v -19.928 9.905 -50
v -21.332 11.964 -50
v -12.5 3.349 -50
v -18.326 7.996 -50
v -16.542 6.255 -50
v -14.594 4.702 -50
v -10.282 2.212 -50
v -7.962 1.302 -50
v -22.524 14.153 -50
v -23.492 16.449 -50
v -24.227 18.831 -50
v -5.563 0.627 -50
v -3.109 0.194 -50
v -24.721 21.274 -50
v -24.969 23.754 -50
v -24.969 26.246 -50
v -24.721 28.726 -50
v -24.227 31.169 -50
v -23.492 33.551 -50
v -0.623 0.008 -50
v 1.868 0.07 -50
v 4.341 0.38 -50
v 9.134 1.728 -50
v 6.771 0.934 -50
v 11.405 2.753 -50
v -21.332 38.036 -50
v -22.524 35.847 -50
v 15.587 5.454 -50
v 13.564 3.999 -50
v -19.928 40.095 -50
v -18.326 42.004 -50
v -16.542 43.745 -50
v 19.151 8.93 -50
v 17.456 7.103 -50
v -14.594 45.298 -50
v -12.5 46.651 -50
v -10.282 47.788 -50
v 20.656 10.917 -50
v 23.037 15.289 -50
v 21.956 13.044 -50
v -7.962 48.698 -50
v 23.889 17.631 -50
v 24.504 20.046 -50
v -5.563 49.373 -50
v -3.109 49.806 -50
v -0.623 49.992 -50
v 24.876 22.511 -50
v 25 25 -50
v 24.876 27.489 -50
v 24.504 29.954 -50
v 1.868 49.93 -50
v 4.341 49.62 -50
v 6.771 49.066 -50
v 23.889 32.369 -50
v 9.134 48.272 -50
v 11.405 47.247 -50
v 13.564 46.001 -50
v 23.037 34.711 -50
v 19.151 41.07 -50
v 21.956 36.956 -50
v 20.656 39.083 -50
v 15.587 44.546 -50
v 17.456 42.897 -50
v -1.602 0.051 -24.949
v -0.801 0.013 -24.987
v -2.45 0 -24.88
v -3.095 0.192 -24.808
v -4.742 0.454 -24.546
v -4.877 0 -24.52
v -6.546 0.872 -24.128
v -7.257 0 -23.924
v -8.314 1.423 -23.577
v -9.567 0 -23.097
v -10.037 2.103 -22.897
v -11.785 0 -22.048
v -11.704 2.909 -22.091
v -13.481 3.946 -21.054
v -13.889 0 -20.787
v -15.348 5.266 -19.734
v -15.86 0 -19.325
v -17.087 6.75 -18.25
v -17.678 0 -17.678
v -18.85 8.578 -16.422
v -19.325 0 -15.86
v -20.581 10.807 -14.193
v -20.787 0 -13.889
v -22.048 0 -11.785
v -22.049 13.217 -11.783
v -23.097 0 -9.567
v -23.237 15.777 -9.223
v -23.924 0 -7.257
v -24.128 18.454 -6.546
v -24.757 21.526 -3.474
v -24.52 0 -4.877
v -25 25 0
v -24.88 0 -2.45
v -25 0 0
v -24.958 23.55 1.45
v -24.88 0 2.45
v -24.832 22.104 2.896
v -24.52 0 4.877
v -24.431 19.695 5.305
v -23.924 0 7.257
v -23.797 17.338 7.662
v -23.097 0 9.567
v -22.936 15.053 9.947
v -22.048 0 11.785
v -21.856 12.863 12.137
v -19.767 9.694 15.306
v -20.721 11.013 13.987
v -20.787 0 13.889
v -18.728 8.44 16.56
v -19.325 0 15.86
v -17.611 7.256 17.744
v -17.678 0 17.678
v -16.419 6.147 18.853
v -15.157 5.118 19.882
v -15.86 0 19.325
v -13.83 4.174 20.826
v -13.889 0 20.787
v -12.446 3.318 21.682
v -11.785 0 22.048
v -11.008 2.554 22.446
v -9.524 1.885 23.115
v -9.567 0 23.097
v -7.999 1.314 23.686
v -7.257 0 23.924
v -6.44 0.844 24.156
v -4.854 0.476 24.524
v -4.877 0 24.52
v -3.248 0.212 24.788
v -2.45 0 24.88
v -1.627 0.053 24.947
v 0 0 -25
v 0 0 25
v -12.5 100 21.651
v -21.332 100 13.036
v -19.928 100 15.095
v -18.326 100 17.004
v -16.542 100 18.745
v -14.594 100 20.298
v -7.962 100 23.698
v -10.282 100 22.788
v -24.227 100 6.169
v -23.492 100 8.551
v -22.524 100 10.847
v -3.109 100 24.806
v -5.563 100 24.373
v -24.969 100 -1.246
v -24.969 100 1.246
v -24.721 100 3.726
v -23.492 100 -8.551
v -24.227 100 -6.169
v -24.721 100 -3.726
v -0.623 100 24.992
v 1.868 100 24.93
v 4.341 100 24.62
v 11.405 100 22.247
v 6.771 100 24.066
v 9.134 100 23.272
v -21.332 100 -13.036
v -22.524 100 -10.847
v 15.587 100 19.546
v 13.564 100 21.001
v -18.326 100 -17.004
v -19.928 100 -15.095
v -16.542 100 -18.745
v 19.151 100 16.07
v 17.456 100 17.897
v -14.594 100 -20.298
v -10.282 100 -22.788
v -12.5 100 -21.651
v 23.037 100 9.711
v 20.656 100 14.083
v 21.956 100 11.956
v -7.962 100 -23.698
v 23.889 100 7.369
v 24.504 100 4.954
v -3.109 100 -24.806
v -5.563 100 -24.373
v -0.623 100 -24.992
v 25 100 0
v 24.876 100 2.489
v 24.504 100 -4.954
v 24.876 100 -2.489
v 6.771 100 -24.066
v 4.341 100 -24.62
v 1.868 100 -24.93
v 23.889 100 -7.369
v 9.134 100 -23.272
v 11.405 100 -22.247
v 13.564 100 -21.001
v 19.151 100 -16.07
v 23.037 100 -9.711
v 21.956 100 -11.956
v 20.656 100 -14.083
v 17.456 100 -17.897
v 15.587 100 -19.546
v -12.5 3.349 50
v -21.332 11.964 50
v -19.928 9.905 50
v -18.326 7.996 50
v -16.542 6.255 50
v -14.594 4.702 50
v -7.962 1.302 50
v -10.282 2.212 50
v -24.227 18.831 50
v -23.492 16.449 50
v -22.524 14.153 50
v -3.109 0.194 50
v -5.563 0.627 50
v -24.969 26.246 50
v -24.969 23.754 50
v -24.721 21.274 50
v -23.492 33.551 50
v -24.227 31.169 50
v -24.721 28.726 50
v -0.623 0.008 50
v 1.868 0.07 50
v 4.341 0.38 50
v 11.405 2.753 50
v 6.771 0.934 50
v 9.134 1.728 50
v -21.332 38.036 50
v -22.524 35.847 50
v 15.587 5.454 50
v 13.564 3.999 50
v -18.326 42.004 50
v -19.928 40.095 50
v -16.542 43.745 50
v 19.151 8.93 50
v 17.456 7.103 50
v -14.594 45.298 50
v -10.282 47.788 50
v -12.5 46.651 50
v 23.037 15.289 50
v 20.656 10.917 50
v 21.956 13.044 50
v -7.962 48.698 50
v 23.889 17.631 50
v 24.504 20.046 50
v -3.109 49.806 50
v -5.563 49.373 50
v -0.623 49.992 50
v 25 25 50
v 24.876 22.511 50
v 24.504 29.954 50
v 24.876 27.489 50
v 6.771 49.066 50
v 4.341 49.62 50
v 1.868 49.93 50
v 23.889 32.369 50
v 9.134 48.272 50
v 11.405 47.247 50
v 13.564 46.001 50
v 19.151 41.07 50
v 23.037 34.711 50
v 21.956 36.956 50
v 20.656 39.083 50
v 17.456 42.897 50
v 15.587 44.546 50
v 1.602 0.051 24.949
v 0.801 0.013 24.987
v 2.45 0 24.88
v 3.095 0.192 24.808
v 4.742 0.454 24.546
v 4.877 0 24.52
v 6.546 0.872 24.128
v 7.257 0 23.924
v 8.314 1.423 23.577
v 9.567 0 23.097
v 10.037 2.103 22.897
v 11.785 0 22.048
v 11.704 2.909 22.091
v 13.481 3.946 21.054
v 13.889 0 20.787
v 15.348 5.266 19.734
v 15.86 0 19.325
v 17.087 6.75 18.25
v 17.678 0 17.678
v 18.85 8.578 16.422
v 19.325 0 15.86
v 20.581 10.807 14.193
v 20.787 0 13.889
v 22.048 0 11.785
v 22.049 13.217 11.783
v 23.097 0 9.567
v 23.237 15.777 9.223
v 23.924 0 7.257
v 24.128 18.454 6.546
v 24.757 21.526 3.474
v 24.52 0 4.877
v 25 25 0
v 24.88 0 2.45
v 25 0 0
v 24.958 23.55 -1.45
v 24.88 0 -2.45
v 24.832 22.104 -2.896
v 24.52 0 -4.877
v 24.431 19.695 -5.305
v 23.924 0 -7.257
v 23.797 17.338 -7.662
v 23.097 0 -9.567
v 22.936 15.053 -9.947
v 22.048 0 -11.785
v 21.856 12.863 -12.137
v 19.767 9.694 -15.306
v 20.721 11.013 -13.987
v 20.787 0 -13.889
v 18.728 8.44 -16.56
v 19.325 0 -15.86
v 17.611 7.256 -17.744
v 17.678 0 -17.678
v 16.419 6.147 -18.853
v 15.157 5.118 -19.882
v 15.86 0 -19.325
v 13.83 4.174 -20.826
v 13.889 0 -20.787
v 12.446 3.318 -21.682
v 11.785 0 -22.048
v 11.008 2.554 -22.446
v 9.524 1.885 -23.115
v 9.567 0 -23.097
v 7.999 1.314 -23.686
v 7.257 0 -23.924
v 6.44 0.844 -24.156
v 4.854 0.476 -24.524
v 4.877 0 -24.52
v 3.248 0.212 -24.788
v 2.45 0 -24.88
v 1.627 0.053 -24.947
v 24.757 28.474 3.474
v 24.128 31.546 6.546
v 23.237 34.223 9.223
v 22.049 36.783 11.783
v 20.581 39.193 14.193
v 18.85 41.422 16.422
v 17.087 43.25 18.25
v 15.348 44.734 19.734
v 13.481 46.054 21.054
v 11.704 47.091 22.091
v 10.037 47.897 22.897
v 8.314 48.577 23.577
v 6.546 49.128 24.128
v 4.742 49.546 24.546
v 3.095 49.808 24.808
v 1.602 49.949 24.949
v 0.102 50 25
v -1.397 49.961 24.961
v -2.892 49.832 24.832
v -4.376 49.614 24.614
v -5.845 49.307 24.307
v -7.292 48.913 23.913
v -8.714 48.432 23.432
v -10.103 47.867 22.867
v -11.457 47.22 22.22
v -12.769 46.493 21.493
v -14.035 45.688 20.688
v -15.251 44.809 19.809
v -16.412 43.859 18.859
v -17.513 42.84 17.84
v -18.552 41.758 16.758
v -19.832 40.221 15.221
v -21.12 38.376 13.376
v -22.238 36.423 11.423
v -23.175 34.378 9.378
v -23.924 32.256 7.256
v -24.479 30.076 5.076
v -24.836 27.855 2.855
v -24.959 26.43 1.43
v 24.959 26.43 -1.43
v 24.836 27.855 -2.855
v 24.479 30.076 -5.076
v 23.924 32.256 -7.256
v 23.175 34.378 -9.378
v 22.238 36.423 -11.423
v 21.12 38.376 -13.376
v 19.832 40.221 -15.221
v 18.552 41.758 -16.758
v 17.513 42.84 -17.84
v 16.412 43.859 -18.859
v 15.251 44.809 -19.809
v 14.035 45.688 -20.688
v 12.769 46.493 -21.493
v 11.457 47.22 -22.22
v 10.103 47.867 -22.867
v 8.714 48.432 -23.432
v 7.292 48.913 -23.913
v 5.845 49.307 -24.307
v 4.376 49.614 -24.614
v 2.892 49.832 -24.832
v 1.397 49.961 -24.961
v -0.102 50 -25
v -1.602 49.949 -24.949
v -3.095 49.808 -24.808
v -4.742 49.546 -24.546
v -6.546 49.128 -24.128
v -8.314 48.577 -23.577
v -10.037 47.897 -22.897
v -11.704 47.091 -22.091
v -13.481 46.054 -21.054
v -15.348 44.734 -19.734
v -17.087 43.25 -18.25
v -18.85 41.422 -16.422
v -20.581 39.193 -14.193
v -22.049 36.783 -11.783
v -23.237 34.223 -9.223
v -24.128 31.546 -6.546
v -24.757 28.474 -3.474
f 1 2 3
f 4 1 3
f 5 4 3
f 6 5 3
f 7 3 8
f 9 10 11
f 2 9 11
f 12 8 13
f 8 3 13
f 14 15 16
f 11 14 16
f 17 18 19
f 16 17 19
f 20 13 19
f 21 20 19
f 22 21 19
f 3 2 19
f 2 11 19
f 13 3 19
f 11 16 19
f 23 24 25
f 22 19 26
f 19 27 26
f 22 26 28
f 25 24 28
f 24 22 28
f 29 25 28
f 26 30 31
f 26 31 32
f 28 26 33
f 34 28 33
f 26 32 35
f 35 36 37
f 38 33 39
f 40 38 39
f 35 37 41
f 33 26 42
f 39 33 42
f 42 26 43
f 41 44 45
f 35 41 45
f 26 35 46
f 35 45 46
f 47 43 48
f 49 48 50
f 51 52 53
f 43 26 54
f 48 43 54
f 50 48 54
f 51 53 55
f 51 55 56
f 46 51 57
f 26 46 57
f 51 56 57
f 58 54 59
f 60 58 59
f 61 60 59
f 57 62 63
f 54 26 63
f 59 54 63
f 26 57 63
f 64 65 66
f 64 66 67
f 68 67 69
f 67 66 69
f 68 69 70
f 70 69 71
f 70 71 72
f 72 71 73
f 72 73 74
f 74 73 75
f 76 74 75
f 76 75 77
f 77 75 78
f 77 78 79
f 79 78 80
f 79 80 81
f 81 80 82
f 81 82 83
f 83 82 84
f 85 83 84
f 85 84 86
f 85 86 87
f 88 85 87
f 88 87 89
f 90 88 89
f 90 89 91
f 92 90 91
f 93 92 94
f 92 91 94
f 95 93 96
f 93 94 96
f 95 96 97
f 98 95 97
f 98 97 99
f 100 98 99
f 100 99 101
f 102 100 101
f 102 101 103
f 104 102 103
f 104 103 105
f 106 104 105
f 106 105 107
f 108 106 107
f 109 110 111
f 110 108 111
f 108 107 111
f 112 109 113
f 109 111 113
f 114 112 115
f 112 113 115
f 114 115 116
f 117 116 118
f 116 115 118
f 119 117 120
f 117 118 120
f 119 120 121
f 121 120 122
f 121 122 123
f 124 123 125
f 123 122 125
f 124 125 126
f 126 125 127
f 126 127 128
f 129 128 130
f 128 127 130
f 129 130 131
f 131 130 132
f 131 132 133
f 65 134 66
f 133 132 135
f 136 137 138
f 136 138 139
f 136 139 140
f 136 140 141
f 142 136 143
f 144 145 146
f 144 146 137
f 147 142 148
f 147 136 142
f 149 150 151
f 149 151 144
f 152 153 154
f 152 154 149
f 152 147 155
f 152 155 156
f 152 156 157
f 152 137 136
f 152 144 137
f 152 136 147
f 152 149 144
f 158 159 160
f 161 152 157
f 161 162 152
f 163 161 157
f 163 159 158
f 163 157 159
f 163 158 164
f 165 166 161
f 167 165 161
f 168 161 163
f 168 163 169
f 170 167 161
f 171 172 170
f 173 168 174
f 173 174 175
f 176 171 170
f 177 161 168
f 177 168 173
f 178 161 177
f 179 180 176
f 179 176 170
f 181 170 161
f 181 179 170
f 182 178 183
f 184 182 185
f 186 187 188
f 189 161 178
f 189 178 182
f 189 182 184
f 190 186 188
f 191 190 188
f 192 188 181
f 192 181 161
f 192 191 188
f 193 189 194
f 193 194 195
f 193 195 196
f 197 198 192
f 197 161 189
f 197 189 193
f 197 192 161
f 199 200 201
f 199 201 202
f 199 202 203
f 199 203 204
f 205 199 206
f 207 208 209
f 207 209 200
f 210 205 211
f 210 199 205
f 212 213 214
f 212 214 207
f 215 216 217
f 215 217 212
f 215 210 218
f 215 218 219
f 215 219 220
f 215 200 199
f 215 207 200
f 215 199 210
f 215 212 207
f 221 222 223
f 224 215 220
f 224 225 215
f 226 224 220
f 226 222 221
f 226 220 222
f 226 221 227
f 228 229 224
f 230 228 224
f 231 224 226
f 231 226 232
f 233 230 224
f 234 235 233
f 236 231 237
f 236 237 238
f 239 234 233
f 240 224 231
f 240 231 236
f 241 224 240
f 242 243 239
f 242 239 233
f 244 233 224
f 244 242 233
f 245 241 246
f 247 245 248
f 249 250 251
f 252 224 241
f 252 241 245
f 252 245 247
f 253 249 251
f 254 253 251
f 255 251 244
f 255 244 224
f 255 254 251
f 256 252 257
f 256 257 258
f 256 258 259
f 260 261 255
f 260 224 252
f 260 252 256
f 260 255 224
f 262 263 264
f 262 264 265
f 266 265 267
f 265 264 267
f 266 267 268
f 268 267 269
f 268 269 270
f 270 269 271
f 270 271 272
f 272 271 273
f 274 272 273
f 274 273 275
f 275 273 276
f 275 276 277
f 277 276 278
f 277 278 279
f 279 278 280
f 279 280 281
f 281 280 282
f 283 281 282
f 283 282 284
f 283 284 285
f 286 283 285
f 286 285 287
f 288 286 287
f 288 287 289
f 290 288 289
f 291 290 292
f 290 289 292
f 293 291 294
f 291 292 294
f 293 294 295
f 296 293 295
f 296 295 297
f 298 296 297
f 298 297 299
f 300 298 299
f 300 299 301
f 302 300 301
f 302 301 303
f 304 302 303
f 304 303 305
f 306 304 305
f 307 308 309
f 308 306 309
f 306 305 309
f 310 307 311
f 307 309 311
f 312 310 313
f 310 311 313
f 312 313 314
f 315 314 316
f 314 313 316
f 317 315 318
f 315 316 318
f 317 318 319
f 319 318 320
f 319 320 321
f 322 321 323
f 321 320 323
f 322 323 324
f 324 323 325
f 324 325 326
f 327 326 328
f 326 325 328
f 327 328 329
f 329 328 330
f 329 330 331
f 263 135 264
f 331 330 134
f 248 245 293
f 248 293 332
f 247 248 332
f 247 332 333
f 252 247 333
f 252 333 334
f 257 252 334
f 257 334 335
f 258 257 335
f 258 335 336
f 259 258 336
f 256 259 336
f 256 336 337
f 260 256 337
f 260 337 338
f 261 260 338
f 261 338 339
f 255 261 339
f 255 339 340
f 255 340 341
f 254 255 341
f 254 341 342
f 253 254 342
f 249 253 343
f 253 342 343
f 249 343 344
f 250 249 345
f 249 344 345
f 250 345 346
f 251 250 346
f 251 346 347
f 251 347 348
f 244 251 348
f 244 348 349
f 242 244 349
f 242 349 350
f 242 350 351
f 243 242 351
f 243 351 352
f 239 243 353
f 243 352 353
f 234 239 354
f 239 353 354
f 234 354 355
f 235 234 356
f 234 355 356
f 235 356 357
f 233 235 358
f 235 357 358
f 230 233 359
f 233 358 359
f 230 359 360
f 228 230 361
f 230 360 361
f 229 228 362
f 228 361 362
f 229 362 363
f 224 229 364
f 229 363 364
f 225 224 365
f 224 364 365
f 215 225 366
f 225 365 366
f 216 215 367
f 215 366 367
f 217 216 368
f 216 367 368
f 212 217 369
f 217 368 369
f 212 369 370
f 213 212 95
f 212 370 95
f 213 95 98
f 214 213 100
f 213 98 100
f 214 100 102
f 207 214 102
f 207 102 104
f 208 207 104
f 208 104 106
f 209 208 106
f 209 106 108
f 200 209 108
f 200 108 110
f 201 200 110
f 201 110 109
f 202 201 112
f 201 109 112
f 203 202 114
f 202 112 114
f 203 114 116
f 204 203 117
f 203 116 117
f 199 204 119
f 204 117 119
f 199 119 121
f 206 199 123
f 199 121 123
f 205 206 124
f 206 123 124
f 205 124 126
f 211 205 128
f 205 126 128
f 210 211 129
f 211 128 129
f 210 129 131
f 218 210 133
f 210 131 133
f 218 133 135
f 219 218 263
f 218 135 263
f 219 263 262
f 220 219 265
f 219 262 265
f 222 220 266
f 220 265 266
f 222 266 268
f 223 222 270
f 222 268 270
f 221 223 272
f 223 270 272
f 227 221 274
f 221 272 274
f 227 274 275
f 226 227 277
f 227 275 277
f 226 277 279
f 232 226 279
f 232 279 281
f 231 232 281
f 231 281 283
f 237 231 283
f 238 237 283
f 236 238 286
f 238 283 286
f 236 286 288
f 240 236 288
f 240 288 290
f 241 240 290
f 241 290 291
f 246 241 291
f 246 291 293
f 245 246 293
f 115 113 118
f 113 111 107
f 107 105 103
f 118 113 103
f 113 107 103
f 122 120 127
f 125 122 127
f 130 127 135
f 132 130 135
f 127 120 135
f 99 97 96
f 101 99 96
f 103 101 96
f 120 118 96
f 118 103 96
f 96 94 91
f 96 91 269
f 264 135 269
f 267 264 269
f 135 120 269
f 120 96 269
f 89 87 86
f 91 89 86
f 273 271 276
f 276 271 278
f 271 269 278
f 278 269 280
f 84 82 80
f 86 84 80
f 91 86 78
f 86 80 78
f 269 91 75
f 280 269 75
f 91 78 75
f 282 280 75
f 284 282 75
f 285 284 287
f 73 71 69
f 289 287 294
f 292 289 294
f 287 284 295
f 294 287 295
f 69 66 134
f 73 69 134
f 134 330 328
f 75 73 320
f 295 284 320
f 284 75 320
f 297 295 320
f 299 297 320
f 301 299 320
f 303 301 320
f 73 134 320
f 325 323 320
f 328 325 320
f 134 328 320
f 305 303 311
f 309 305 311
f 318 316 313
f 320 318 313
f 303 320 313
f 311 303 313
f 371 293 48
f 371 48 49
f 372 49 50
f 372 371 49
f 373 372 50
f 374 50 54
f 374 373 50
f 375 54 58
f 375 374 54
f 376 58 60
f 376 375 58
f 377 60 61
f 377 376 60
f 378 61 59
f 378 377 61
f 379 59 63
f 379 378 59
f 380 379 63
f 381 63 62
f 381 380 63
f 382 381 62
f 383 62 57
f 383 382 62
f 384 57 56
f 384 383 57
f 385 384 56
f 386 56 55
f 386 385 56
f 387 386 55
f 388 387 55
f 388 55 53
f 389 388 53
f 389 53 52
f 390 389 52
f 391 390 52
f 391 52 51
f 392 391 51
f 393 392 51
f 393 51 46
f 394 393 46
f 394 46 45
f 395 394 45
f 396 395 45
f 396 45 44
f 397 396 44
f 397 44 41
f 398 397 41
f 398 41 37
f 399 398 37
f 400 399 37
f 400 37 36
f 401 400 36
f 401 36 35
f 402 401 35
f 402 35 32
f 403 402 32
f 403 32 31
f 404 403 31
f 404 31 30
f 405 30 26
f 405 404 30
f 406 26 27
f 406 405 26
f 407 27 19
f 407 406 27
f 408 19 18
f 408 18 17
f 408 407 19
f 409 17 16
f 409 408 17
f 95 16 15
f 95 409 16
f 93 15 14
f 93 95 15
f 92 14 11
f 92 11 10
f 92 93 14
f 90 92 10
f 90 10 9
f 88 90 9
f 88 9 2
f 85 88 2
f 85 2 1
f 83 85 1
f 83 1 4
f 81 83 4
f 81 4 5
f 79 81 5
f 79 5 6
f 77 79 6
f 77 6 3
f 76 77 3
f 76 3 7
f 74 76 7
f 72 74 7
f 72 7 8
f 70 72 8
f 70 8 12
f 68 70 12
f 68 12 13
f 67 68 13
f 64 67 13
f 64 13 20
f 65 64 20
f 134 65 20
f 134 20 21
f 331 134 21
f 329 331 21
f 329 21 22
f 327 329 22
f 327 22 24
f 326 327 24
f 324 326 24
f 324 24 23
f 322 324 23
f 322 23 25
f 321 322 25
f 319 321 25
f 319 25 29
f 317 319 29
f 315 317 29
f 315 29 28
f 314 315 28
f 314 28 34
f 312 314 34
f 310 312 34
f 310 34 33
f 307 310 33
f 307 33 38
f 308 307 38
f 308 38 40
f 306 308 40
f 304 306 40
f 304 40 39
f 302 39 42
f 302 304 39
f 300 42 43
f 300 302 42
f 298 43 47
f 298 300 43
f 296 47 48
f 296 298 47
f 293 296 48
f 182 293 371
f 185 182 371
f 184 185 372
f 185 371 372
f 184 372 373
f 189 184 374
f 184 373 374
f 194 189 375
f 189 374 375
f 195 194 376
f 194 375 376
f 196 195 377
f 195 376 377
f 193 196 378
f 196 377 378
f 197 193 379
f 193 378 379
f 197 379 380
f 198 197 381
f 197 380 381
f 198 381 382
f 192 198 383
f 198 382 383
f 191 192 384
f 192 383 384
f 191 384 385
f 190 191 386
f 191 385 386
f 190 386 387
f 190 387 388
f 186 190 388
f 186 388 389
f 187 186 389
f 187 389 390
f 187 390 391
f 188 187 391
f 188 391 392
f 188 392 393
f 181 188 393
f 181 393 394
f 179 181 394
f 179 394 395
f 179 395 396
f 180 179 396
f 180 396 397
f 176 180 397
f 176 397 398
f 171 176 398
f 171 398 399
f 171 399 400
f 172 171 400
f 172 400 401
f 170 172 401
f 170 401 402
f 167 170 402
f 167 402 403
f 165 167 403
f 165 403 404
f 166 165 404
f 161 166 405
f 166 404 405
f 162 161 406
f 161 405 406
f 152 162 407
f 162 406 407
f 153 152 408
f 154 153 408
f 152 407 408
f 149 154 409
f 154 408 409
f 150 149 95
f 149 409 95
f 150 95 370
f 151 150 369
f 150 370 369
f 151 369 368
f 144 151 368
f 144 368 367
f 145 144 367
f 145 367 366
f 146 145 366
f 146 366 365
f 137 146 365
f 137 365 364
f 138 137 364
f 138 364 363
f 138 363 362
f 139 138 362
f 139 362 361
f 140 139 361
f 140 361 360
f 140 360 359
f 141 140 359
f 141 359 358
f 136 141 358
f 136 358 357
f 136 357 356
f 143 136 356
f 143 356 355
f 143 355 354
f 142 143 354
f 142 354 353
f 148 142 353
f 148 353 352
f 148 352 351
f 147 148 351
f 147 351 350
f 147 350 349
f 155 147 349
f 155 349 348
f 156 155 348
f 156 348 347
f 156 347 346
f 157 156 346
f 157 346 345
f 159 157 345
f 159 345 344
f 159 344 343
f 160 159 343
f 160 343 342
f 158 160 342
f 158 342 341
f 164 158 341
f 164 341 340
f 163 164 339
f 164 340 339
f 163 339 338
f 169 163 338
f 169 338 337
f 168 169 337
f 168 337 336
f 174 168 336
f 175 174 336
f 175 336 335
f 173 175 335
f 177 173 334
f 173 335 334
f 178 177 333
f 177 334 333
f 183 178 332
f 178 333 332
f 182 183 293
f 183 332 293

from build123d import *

# Parameters (mm, degrees)
SKETCH1_R                = 25
BOSS_EXTRUDE1_DEPTH      = 100
BOSS_EXTRUDE2_DEPTH      = 50
BOSS_EXTRUDE2_DEPTH_BACK = 50
SKETCH2_R                = 25


with BuildPart() as part:
    # Sketch1 → Boss-Extrude1 (new body)
    with BuildSketch(Plane(origin=(0, 0, 0), x_dir=(1, 0, 0), z_dir=(0, 1, 0))):
        Circle(SKETCH1_R)
    extrude(amount=BOSS_EXTRUDE1_DEPTH)

    # Sketch2 → Boss-Extrude2 (add, two sides: drawn at the far end of the back side and taken through both)
    with BuildSketch(Plane.XY.offset(-BOSS_EXTRUDE2_DEPTH_BACK)):
        with Locations((0, 25)):
            Circle(SKETCH2_R)
    extrude(amount=BOSS_EXTRUDE2_DEPTH + BOSS_EXTRUDE2_DEPTH_BACK)


solid = part.part
